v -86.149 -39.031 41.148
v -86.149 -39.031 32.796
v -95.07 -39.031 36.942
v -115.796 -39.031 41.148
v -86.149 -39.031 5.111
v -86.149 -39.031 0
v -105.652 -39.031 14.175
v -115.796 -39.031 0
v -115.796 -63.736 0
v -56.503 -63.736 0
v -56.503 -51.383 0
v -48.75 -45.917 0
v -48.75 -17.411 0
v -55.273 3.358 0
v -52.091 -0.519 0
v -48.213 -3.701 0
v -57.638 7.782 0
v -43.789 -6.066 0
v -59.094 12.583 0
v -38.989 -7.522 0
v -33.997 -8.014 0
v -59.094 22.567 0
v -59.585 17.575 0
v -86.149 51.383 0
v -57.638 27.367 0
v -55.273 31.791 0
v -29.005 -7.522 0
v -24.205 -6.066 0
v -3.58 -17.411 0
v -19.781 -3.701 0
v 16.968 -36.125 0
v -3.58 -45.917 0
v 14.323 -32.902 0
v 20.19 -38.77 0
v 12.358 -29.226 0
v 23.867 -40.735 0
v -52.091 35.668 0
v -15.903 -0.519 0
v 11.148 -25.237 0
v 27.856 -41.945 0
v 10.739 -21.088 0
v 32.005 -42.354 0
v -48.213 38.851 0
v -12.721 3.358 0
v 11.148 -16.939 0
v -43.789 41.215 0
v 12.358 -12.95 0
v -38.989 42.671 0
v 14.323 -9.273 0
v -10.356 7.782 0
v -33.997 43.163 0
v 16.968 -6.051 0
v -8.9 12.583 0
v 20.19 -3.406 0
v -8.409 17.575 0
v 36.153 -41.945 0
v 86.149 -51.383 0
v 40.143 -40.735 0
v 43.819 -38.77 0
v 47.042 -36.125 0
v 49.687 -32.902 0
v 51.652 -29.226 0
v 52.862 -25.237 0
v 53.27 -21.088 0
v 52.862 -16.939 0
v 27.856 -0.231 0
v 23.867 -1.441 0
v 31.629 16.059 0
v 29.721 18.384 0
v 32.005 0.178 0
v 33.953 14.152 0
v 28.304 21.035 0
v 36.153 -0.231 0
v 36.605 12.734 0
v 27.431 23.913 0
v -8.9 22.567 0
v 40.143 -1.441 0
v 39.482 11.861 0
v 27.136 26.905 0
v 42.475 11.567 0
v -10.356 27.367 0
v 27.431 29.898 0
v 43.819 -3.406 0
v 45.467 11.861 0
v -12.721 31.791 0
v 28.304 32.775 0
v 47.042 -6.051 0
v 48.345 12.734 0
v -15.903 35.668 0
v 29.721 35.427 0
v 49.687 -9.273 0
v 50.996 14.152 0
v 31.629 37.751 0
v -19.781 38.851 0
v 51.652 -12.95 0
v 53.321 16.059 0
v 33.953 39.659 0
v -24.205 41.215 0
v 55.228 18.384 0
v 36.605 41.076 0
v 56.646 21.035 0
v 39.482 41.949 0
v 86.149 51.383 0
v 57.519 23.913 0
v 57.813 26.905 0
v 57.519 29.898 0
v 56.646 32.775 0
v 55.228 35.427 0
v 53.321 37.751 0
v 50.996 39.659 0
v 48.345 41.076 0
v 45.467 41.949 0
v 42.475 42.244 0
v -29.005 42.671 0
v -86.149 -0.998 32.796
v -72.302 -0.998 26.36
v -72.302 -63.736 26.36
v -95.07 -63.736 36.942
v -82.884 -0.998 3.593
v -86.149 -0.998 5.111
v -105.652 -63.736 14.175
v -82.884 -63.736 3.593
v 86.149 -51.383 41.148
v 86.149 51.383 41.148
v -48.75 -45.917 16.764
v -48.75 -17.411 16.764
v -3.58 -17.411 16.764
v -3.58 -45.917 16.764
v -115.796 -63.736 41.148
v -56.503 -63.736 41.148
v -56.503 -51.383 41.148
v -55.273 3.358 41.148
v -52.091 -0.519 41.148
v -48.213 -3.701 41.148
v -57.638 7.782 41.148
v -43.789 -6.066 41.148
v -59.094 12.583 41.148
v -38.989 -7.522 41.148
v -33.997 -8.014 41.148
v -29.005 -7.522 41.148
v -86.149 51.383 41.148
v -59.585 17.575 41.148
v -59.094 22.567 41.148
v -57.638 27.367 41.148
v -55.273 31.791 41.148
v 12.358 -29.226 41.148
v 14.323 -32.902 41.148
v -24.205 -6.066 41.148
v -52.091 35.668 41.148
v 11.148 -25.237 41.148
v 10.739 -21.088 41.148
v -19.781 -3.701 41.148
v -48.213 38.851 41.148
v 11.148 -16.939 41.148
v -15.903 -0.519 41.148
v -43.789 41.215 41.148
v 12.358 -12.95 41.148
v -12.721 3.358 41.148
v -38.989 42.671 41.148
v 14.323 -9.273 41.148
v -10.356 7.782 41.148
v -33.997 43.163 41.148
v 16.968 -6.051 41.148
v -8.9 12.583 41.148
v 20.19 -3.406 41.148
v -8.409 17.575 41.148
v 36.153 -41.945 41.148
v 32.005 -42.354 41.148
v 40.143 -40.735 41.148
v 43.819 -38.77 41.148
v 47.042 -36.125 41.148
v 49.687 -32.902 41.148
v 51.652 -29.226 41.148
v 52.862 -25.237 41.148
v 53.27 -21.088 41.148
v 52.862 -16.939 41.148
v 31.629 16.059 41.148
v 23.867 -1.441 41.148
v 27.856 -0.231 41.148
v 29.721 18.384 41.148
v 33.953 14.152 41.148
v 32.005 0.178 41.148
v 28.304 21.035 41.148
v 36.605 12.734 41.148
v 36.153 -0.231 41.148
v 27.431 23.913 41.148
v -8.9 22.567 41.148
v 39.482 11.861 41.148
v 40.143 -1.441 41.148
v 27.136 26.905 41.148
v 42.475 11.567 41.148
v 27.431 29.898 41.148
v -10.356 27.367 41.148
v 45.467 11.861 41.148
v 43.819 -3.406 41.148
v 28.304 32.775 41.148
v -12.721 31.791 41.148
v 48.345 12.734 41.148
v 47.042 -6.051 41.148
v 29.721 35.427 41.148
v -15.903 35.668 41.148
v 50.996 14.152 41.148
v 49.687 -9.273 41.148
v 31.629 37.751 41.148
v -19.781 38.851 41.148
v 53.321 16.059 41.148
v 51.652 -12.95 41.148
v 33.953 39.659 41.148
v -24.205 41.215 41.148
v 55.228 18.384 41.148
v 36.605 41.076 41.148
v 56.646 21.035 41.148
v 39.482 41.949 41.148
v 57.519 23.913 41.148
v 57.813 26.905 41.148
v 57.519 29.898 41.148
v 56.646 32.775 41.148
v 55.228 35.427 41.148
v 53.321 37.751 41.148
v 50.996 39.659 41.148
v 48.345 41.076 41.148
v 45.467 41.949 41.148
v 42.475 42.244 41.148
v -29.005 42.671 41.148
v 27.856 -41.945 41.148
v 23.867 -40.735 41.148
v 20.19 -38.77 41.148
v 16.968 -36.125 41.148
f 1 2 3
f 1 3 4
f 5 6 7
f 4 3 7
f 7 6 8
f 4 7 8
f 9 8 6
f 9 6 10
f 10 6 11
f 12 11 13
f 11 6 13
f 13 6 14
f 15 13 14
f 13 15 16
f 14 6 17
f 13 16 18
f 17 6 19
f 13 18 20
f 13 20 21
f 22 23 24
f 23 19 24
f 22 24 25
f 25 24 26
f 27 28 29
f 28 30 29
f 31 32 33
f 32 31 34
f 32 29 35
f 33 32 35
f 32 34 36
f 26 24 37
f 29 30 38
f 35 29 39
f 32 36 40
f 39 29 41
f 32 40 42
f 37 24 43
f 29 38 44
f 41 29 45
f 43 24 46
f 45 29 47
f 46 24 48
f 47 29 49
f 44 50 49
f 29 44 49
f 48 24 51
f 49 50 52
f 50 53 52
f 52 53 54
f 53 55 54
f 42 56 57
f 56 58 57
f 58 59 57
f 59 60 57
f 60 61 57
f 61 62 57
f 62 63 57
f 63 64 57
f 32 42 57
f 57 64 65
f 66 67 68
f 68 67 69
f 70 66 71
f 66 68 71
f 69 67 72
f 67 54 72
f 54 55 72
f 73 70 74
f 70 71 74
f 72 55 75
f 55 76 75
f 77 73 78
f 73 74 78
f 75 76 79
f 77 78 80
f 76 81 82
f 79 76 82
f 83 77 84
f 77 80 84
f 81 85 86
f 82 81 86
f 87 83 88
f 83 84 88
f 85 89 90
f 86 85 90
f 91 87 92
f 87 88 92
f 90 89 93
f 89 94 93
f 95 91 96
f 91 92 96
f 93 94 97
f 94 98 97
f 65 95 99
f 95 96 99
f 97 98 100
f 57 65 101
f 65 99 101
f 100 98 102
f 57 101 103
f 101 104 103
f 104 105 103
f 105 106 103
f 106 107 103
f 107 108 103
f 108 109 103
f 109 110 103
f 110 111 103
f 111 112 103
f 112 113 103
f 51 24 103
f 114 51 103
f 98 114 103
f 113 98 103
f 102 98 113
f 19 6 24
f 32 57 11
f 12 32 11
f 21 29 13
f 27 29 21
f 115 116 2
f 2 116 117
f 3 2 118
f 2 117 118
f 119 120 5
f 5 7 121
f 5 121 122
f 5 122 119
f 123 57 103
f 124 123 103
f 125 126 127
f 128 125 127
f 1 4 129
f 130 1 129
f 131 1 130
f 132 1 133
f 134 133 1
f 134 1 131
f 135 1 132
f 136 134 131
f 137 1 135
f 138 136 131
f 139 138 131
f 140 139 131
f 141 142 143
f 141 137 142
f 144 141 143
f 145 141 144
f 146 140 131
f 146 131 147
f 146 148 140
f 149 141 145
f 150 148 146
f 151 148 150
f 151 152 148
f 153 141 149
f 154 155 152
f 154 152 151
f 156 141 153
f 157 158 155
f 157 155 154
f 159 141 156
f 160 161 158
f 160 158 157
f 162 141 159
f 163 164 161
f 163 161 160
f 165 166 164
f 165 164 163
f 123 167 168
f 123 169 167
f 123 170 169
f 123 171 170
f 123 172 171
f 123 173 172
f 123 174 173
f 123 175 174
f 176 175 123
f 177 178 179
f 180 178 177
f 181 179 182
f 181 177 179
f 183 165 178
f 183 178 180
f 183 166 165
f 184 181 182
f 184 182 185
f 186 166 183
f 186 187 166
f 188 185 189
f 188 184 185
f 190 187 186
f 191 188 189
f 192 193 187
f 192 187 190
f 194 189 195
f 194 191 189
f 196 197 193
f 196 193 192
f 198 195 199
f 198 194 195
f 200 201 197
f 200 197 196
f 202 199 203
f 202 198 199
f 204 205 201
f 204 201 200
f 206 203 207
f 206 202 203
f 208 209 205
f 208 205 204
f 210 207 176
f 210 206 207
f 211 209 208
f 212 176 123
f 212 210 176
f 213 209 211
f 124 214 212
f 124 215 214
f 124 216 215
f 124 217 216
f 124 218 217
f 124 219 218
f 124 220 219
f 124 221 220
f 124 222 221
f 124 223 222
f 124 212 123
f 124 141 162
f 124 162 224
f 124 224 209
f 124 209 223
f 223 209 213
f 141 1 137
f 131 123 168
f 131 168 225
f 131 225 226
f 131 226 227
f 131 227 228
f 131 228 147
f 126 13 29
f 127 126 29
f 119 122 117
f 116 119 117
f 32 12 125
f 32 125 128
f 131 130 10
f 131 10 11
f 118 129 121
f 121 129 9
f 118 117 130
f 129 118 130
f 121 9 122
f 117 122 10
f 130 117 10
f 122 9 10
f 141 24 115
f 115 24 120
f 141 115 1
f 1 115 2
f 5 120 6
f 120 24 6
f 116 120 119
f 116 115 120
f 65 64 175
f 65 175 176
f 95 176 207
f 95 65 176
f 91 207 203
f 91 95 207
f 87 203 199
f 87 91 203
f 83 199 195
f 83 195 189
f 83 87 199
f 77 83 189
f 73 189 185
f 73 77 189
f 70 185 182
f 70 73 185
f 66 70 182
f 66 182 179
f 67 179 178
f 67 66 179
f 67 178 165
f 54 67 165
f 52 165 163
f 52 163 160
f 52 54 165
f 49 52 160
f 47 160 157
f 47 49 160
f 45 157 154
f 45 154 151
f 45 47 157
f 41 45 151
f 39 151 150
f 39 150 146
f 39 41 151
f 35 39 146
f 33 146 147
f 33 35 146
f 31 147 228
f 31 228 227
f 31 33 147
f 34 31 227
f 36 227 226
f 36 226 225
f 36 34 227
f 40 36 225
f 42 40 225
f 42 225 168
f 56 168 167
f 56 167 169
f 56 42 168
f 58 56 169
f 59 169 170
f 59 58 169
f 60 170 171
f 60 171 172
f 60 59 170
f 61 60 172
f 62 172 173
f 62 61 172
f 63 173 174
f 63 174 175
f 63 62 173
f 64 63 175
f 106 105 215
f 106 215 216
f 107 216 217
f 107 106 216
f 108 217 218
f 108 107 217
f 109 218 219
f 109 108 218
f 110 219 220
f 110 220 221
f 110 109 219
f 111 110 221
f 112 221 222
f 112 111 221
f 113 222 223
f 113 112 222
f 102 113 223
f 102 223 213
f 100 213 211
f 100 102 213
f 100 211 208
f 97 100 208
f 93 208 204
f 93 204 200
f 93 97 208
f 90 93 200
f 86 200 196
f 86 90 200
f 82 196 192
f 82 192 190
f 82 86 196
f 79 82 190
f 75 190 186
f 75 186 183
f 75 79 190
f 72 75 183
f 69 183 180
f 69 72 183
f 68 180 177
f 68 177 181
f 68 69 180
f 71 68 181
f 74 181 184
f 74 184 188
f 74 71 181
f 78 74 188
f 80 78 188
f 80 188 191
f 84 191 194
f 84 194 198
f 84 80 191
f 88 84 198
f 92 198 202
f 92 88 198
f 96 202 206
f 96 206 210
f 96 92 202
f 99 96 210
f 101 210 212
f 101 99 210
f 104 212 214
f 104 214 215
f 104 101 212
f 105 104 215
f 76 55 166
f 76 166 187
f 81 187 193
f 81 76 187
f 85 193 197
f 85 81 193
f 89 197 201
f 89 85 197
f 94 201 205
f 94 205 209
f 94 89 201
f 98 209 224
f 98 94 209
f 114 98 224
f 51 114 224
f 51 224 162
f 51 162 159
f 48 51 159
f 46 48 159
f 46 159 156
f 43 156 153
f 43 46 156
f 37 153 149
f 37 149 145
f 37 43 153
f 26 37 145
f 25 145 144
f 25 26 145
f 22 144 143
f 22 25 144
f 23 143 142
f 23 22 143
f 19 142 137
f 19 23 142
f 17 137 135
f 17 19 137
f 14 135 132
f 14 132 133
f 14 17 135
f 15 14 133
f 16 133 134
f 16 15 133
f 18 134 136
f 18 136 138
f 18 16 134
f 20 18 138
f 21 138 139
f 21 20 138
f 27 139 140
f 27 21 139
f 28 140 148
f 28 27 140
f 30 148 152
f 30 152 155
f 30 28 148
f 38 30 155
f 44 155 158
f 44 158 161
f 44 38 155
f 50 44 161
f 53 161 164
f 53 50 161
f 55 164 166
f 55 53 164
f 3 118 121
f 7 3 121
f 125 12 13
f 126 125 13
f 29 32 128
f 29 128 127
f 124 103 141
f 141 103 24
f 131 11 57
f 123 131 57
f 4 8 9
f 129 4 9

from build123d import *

# Parameters (mm, degrees)
F0_R     = 21.2656768744
F0_R_2   = 25.5883994311
F0_R_3   = 15.3385974219
F0_W     = 29.6467319131
F0_H     = 12.3528018594
F1_DEPTH = 41.148
F3_DEPTH = 62.738
F4_W     = 45.1700200792
F4_H     = 28.5053551197
F5_DEPTH = 16.764


with BuildPart() as f1:
    # F0 (on Top) → F1 (new body)
    with BuildSketch(Plane.XY):
        Polygon((86.1493721604, -51.383343386), (86.1493721604, 51.383343386), (-86.1493721604, 51.383343386), (-86.1493721604, -39.0305415266), (-56.5026402473, -39.0305415266), (-56.5026402473, -51.383343386), align=None)
        with Locations((32.0047549903, -21.087879315)):
            Circle(F0_R, mode=Mode.SUBTRACT)
        with Locations((-33.9969657362, 17.5746399909)):
            Circle(F0_R_2, mode=Mode.SUBTRACT)
        with Locations((42.4747541547, 26.905214414)):
            Circle(F0_R_3, mode=Mode.SUBTRACT)
        with Locations((-71.3260062039, -45.2069424563)):
            Rectangle(F0_W, F0_H)
        Polygon((-86.1493721604, -51.383343386), (-86.1493721604, -39.0305415266), (-115.7961040735, -39.0305415266), (-115.7961040735, -63.7361452454), (-56.5026402473, -63.7361452454), (-56.5026402473, -51.383343386), align=None)
    extrude(amount=F1_DEPTH)

    # F2 (on face) → F3 (cut)
    with BuildSketch(Plane.XZ.offset(63.7361452454)):
        Polygon((-82.8842633783, 3.5929778848), (-72.3024426285, 26.3603644998), (-95.0698292435, 36.9421852496), (-105.6516499933, 14.1747986345), align=None)
    extrude(amount=-F3_DEPTH, mode=Mode.SUBTRACT)

    # F4 (on Top) → F5 (cut)
    with BuildSketch(Plane.XY):
        with Locations((-26.1654389324, -31.664095819)):
            Rectangle(F4_W, F4_H)
    extrude(amount=F5_DEPTH, mode=Mode.SUBTRACT)


solid = f1.part
